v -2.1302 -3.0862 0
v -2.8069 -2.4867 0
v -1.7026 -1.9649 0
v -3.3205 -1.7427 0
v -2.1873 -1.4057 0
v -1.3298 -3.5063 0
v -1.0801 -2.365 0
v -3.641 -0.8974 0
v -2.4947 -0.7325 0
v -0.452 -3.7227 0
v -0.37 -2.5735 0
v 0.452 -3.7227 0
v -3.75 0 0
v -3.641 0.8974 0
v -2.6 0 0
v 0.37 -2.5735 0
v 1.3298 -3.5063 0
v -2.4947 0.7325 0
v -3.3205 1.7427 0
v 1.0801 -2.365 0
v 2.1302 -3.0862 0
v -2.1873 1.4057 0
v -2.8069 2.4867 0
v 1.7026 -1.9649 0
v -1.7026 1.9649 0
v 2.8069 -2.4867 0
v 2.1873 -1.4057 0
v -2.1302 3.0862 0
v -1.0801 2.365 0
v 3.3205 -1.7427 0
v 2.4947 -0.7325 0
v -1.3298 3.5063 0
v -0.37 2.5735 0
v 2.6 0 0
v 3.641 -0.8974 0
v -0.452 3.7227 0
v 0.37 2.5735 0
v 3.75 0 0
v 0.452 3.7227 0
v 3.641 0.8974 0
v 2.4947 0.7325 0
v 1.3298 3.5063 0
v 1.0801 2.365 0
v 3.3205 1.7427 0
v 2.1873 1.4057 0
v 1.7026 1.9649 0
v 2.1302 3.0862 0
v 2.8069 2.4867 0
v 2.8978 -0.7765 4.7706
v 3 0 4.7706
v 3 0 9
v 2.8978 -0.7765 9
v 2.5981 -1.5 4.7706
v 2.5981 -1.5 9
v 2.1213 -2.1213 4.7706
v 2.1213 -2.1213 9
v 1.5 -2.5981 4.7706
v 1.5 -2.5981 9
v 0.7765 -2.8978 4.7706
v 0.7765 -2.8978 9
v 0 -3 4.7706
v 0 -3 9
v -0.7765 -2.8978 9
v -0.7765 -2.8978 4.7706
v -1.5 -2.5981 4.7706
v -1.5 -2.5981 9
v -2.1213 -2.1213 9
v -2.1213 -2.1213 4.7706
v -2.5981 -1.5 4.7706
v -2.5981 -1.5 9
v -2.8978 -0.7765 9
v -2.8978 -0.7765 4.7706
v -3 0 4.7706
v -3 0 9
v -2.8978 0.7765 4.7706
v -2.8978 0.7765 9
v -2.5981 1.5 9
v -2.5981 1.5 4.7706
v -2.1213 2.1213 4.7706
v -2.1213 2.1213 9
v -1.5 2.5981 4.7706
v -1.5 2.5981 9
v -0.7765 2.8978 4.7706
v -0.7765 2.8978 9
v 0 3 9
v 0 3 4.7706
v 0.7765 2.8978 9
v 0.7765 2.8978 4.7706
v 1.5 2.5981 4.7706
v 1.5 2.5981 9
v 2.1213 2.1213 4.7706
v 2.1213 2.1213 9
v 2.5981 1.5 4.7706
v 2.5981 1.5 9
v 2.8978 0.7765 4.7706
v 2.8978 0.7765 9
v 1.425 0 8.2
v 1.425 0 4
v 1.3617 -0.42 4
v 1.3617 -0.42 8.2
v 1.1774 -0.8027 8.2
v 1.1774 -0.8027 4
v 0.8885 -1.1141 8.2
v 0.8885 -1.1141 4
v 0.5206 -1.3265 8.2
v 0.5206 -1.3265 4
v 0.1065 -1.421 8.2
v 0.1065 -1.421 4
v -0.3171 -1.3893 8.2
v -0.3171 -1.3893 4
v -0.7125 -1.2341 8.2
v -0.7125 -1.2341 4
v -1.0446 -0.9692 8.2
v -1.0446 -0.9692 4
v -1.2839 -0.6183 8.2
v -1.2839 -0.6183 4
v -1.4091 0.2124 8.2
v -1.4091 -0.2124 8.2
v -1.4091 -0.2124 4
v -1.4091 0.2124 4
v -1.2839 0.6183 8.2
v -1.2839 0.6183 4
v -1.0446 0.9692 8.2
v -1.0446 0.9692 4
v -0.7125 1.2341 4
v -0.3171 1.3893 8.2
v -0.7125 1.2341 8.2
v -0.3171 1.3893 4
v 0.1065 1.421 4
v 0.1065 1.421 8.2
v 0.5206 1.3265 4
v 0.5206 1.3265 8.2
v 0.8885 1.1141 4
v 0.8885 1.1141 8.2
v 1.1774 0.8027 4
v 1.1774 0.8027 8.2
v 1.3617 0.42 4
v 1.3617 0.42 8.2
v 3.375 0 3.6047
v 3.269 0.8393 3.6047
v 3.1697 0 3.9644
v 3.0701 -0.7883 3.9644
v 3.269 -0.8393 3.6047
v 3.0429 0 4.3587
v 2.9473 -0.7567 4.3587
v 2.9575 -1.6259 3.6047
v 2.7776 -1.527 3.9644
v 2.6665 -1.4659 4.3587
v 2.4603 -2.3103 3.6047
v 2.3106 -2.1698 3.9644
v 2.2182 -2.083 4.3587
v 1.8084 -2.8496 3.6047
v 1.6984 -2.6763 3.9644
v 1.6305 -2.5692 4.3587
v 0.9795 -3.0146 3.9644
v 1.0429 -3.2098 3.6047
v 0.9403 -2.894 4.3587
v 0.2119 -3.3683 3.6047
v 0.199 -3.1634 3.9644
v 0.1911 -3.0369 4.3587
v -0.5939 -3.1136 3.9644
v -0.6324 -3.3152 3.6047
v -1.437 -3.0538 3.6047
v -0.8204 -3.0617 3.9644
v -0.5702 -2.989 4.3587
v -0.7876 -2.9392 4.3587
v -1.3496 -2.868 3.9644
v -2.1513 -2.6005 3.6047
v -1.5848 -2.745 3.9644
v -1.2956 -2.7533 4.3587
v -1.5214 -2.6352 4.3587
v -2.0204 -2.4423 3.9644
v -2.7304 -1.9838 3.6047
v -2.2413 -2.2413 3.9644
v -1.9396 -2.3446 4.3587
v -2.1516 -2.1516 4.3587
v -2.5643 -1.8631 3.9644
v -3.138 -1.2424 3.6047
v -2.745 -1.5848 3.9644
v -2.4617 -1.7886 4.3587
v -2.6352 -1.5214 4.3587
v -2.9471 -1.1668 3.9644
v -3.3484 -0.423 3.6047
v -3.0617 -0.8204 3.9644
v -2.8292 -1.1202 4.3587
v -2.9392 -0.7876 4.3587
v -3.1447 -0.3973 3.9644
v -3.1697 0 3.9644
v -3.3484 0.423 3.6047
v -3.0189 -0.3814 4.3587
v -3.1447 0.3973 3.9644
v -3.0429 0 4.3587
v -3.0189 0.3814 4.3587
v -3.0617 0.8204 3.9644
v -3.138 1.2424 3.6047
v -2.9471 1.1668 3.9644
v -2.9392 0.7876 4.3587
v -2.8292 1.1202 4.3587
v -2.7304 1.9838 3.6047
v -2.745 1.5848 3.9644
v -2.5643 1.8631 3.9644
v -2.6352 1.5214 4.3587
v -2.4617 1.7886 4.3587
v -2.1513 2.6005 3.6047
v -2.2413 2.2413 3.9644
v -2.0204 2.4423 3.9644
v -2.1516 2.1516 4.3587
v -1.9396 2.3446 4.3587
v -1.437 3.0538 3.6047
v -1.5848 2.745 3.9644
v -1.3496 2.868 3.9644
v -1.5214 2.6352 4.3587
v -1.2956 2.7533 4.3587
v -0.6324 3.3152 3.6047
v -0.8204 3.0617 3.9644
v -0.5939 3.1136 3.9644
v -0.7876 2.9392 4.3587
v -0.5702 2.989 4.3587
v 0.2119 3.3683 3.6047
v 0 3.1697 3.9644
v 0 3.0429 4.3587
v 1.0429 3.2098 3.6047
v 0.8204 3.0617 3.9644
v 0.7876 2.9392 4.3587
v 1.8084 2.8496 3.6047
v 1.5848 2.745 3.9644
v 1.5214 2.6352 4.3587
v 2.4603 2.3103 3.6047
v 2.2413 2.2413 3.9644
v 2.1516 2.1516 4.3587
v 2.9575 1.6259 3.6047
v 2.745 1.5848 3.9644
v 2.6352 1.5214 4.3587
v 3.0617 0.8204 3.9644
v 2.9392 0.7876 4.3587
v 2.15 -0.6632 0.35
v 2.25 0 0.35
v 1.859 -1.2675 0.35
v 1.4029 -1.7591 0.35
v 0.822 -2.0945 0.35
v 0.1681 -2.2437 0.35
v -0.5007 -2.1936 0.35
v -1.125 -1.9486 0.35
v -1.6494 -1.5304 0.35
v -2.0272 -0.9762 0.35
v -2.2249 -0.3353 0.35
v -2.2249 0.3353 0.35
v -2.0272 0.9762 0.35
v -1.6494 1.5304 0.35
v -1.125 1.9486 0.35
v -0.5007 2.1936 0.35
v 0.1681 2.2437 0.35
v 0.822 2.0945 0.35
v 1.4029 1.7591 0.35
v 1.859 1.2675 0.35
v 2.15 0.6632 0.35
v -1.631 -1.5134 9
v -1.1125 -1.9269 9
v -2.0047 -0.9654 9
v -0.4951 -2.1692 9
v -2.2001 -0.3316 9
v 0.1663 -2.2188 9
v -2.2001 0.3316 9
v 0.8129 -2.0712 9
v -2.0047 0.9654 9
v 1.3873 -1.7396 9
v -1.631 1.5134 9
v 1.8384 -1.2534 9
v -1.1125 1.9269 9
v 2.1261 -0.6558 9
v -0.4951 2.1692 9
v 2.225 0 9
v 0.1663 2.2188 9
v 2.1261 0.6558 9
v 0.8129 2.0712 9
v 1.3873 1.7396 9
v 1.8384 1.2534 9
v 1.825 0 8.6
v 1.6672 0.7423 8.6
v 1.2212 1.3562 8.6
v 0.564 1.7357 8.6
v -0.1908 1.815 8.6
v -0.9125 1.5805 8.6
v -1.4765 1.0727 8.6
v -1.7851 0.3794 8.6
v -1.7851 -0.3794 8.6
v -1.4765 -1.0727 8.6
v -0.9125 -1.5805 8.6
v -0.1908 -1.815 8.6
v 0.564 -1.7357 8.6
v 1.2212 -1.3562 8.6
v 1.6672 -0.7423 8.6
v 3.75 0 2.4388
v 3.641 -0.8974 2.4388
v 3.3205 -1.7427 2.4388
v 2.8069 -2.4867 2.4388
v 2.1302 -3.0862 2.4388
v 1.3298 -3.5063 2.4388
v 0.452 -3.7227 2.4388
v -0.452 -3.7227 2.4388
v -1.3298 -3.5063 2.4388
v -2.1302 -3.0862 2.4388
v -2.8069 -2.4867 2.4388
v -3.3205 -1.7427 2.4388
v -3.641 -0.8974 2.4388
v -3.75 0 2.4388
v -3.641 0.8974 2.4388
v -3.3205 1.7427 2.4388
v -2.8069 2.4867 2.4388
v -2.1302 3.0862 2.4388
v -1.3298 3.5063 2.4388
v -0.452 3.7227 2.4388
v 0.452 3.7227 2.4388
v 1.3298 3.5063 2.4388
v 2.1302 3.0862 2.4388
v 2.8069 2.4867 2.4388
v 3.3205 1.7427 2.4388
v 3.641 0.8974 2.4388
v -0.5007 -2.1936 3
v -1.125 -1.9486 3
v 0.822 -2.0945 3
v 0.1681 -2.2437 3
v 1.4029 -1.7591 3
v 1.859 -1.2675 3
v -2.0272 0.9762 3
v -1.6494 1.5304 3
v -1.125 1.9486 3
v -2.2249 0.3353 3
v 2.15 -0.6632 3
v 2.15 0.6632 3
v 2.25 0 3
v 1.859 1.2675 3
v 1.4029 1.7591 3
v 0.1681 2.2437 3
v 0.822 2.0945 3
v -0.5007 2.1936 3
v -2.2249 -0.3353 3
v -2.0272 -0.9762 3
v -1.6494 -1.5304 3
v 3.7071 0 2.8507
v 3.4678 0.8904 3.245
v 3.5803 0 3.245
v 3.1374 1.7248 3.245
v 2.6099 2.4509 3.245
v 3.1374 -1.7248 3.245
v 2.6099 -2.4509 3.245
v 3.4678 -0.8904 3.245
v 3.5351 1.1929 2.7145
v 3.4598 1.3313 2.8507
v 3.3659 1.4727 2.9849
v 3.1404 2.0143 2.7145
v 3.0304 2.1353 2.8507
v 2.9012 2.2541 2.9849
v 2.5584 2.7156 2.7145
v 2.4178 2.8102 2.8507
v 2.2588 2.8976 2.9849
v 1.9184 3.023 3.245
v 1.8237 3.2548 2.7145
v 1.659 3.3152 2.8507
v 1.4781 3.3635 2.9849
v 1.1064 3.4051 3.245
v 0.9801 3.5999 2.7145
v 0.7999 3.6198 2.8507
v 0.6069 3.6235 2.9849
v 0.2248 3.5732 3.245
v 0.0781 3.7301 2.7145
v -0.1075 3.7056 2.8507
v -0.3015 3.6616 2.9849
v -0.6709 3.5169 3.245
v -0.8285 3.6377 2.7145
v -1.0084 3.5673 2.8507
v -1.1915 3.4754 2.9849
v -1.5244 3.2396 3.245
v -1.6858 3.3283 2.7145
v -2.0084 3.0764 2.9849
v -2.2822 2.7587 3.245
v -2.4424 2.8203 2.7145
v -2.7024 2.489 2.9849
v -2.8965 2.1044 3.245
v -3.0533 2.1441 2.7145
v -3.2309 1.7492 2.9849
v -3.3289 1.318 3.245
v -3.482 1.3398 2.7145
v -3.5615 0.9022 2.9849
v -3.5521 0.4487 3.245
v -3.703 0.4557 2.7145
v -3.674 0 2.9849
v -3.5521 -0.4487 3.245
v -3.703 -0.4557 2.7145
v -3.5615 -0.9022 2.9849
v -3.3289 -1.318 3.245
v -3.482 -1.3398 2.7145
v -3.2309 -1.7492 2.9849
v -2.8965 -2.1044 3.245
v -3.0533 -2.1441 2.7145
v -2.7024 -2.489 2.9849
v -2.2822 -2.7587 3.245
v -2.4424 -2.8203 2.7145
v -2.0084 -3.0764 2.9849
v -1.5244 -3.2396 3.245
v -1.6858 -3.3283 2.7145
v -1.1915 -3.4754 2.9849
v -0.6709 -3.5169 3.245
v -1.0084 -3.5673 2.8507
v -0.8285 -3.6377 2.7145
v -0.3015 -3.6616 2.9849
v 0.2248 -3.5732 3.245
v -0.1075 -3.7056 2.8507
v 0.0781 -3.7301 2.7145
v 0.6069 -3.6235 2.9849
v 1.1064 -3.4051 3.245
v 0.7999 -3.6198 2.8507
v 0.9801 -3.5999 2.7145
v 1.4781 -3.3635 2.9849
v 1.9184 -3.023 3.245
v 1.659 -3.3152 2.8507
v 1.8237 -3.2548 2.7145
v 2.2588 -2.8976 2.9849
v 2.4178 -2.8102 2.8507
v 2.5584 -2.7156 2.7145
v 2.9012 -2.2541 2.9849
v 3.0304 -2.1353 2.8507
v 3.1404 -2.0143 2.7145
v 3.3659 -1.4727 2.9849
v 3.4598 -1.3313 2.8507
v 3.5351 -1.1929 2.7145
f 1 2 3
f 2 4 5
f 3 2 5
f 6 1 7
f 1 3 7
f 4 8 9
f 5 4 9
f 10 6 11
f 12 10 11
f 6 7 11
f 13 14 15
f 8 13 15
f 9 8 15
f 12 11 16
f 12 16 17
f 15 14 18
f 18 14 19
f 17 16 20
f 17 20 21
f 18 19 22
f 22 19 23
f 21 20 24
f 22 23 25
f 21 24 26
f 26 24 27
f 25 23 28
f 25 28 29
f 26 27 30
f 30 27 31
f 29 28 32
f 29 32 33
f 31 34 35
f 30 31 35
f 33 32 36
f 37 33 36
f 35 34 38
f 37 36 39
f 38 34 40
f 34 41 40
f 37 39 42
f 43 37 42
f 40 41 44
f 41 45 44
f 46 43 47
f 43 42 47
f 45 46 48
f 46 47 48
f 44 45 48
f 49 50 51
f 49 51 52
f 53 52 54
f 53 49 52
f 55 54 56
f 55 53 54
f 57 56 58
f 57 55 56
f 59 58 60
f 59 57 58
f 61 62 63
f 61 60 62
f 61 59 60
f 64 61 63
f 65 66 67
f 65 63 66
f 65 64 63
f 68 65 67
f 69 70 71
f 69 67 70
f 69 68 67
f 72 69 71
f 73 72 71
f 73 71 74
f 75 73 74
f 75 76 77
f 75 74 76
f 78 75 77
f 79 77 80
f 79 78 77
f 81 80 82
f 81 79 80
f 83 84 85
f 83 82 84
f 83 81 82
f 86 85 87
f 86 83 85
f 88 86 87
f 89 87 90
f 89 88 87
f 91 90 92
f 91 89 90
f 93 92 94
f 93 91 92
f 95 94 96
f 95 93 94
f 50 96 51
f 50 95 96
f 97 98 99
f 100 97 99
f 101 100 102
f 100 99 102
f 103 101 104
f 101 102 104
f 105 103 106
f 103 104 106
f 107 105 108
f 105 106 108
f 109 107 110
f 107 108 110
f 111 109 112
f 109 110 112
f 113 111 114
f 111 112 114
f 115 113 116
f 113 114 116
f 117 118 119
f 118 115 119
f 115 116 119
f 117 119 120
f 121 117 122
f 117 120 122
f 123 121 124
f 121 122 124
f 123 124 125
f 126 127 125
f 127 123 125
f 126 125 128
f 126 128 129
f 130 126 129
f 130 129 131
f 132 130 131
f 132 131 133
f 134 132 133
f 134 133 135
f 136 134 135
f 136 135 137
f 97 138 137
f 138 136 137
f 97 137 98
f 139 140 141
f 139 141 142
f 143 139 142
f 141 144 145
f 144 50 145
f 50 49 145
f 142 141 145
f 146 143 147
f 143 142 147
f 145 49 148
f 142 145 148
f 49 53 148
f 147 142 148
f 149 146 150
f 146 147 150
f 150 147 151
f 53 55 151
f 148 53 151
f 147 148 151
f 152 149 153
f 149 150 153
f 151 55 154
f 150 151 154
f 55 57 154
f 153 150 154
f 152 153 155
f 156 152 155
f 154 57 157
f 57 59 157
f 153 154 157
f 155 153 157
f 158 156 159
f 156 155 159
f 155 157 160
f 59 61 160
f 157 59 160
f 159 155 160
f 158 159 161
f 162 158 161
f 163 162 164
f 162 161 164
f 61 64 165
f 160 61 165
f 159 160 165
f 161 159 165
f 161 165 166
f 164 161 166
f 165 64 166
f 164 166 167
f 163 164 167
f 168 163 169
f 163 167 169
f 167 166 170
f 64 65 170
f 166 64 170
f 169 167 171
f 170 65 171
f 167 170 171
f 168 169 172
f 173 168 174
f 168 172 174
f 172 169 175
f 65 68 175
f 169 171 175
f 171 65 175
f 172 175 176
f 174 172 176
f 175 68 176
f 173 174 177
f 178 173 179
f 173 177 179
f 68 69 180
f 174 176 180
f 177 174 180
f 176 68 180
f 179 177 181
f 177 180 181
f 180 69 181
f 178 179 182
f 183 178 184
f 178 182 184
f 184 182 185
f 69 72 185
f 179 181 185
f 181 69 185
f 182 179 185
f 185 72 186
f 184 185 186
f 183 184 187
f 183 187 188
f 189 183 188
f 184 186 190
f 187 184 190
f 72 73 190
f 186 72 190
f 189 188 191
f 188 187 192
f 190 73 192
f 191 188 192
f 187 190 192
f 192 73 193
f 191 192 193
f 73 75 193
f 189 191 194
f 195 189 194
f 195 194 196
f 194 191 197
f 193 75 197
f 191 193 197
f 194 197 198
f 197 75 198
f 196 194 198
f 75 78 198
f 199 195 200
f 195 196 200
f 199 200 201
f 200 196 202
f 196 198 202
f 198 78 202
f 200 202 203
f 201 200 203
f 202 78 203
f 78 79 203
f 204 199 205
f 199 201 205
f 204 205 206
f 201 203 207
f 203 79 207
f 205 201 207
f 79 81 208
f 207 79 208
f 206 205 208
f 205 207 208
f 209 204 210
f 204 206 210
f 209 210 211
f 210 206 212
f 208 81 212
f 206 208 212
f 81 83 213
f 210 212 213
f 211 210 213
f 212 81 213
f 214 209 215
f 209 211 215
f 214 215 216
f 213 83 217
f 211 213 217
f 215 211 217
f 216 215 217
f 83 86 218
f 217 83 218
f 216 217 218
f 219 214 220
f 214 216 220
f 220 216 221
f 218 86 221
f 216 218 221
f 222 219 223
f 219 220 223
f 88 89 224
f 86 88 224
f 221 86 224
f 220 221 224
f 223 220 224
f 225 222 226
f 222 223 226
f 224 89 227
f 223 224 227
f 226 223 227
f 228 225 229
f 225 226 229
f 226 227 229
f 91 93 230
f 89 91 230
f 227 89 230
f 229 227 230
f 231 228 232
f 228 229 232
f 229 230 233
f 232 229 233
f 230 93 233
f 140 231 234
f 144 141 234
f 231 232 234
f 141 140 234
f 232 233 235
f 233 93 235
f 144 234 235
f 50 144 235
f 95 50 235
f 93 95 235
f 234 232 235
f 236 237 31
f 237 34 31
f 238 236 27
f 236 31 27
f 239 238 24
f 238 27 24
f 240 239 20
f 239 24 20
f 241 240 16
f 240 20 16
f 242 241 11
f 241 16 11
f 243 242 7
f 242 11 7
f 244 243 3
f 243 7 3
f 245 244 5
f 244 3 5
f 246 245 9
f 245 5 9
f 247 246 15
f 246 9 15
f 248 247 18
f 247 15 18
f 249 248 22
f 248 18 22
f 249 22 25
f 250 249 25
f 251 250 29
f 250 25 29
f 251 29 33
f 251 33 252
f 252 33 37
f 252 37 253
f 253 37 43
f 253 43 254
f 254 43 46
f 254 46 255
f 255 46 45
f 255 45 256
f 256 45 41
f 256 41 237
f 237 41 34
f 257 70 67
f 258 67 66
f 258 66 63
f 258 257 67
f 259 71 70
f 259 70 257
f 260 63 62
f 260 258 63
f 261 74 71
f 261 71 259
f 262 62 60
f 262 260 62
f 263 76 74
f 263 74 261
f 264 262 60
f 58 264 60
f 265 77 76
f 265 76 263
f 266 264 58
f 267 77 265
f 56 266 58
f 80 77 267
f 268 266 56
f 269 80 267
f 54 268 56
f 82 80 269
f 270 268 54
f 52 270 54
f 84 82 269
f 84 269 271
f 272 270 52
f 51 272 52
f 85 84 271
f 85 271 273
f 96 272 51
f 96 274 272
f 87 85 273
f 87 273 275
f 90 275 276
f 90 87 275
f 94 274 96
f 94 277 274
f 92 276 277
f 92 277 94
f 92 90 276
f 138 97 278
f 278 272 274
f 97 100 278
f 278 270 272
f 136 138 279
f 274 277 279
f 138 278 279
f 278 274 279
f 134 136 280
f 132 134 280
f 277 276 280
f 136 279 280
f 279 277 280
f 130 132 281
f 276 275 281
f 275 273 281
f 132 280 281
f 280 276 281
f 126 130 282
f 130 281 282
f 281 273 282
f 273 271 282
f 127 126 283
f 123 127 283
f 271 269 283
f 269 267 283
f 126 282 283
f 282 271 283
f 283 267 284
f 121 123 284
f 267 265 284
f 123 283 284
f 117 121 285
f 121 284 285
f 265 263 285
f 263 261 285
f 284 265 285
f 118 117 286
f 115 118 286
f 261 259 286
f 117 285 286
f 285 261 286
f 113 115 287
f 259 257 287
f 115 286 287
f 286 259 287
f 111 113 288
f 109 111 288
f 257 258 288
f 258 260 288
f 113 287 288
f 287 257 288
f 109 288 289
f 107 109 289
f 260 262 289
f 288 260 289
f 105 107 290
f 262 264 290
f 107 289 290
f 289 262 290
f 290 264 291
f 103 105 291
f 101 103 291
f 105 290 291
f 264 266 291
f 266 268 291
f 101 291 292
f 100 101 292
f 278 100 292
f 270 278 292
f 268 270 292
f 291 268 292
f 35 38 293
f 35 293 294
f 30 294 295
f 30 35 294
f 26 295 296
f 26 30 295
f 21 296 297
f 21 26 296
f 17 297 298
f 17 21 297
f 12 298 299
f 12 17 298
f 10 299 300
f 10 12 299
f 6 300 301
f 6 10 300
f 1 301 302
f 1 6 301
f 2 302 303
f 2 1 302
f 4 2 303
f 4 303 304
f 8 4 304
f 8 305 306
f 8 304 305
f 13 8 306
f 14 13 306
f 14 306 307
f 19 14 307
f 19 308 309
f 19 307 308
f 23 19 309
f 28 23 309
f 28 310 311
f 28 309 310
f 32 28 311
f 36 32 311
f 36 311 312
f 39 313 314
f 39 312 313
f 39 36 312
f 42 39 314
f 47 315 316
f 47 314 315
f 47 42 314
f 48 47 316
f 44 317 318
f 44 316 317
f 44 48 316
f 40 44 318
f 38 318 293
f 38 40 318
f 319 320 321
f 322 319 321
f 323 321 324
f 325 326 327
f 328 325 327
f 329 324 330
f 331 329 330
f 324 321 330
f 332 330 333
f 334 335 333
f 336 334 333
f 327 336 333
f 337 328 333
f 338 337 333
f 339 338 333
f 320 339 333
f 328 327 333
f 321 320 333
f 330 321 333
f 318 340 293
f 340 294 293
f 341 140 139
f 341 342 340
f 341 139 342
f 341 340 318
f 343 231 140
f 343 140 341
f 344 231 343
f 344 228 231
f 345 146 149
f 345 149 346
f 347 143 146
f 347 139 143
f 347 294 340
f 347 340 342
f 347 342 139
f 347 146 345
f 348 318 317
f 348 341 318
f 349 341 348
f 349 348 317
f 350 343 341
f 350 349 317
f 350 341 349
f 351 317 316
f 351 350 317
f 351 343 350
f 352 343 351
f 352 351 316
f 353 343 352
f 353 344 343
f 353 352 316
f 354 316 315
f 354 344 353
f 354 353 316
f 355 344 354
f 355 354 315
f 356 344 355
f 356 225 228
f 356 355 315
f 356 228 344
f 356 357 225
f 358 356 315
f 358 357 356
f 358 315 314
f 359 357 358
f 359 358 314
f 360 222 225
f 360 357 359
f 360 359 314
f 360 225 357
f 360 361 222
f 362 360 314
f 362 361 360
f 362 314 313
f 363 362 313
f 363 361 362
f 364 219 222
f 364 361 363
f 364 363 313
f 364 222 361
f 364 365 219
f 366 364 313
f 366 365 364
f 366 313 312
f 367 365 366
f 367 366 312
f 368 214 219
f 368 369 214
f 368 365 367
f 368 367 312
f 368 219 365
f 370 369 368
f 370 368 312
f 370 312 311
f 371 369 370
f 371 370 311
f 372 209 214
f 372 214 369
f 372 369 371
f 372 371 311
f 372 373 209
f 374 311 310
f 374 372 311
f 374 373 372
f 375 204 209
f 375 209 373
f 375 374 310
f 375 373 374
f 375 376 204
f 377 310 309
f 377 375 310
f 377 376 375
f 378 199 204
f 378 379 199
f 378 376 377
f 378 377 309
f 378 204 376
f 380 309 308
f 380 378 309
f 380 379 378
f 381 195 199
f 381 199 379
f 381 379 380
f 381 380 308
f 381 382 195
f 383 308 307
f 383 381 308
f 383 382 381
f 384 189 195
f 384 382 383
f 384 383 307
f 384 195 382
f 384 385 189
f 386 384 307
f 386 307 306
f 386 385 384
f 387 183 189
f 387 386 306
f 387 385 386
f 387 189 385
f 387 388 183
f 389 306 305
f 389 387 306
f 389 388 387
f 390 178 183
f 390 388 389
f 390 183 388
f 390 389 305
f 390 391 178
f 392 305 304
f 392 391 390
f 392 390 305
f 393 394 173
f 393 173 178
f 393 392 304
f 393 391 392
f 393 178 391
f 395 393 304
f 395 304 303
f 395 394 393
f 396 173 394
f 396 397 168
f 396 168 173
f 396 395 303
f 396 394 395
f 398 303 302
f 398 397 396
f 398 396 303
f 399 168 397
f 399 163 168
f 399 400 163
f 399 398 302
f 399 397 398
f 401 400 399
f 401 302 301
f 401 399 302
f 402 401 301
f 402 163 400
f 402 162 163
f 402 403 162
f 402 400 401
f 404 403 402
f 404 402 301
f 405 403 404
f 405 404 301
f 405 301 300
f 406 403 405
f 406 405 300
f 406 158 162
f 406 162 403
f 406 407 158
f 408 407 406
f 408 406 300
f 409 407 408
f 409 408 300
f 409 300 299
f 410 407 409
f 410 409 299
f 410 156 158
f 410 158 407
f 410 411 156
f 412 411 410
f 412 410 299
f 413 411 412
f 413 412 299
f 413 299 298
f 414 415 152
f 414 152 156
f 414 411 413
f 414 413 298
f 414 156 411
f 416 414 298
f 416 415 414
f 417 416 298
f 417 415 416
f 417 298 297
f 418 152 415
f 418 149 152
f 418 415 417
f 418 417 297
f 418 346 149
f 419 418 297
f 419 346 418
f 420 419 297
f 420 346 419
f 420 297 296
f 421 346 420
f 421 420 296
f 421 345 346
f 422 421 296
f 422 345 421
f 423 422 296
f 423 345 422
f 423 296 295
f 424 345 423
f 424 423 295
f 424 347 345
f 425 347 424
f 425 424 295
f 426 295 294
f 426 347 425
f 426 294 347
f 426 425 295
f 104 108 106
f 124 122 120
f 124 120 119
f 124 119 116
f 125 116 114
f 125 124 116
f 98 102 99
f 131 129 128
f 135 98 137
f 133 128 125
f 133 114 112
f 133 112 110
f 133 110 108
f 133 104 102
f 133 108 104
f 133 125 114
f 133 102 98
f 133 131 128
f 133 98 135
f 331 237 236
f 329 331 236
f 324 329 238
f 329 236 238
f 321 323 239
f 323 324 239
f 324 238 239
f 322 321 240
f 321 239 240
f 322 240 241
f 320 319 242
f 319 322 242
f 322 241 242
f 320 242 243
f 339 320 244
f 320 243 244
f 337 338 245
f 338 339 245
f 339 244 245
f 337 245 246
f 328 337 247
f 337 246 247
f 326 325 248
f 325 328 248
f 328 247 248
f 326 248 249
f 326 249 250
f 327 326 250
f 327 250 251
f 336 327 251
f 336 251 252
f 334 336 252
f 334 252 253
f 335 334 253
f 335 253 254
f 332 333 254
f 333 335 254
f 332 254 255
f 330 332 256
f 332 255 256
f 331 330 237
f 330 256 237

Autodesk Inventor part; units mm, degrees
ref_plane "YZ Plane" through (0, 0, 0) normal (1, 0, 0) x (0, 1, 0)
ref_plane "XZ Plane" through (0, 0, 0) normal (0, 1, 0) x (-1, 0, 0)
ref_plane "XY Plane" through (0, 0, 0) normal (0, 0, 1) x (1, 0, 0)
sketch "Szkic1" plane through (0, 0, 0) normal (0, 0, 1) x (1, 0, 0)
  circle A0 centre (0, 0) radius 2.25
  circle A1 centre (0, 0) radius 3.75
  dimension "d0" = 4.5
  dimension "d1" = 1.5
extrude "Wyciągnięcie proste1" add sketch "Szkic1" along normal blind 3
sketch "Szkic2" plane through (0, 0, 3) normal (0, 0, 1) x (1, 0, 0)
  circle A0 centre (0, 0) radius 3.75 projected
  circle A1 centre (0, 0) radius 2.25 projected
extrude "Wyciągnięcie proste2" add sketch "Szkic2" along normal blind 1 contours A0 | A1
sketch "Szkic3" plane through (0, 0, 4) normal (0, 0, 1) x (1, 0, 0)
  circle A0 centre (0, 0) radius 1.425
  circle A1 centre (0, 0) radius 3
  dimension "d6" = 2.85
  dimension "d7" = 6
extrude "Wyciągnięcie proste3" add sketch "Szkic3" along normal blind 5
fillet "Zaokrąglenie1" radius 2 2 edges at (-3.75, 0, 4) (-3, 0, 4)
chamfer "Faza1" distance 0.8 angle 45 1 edges at (-1.425, 0, 9)
chamfer "Faza2" distance 0.35 angle 45 1 edges at (-2.25, 0, 0)
properties part number "MagnetHolder"
